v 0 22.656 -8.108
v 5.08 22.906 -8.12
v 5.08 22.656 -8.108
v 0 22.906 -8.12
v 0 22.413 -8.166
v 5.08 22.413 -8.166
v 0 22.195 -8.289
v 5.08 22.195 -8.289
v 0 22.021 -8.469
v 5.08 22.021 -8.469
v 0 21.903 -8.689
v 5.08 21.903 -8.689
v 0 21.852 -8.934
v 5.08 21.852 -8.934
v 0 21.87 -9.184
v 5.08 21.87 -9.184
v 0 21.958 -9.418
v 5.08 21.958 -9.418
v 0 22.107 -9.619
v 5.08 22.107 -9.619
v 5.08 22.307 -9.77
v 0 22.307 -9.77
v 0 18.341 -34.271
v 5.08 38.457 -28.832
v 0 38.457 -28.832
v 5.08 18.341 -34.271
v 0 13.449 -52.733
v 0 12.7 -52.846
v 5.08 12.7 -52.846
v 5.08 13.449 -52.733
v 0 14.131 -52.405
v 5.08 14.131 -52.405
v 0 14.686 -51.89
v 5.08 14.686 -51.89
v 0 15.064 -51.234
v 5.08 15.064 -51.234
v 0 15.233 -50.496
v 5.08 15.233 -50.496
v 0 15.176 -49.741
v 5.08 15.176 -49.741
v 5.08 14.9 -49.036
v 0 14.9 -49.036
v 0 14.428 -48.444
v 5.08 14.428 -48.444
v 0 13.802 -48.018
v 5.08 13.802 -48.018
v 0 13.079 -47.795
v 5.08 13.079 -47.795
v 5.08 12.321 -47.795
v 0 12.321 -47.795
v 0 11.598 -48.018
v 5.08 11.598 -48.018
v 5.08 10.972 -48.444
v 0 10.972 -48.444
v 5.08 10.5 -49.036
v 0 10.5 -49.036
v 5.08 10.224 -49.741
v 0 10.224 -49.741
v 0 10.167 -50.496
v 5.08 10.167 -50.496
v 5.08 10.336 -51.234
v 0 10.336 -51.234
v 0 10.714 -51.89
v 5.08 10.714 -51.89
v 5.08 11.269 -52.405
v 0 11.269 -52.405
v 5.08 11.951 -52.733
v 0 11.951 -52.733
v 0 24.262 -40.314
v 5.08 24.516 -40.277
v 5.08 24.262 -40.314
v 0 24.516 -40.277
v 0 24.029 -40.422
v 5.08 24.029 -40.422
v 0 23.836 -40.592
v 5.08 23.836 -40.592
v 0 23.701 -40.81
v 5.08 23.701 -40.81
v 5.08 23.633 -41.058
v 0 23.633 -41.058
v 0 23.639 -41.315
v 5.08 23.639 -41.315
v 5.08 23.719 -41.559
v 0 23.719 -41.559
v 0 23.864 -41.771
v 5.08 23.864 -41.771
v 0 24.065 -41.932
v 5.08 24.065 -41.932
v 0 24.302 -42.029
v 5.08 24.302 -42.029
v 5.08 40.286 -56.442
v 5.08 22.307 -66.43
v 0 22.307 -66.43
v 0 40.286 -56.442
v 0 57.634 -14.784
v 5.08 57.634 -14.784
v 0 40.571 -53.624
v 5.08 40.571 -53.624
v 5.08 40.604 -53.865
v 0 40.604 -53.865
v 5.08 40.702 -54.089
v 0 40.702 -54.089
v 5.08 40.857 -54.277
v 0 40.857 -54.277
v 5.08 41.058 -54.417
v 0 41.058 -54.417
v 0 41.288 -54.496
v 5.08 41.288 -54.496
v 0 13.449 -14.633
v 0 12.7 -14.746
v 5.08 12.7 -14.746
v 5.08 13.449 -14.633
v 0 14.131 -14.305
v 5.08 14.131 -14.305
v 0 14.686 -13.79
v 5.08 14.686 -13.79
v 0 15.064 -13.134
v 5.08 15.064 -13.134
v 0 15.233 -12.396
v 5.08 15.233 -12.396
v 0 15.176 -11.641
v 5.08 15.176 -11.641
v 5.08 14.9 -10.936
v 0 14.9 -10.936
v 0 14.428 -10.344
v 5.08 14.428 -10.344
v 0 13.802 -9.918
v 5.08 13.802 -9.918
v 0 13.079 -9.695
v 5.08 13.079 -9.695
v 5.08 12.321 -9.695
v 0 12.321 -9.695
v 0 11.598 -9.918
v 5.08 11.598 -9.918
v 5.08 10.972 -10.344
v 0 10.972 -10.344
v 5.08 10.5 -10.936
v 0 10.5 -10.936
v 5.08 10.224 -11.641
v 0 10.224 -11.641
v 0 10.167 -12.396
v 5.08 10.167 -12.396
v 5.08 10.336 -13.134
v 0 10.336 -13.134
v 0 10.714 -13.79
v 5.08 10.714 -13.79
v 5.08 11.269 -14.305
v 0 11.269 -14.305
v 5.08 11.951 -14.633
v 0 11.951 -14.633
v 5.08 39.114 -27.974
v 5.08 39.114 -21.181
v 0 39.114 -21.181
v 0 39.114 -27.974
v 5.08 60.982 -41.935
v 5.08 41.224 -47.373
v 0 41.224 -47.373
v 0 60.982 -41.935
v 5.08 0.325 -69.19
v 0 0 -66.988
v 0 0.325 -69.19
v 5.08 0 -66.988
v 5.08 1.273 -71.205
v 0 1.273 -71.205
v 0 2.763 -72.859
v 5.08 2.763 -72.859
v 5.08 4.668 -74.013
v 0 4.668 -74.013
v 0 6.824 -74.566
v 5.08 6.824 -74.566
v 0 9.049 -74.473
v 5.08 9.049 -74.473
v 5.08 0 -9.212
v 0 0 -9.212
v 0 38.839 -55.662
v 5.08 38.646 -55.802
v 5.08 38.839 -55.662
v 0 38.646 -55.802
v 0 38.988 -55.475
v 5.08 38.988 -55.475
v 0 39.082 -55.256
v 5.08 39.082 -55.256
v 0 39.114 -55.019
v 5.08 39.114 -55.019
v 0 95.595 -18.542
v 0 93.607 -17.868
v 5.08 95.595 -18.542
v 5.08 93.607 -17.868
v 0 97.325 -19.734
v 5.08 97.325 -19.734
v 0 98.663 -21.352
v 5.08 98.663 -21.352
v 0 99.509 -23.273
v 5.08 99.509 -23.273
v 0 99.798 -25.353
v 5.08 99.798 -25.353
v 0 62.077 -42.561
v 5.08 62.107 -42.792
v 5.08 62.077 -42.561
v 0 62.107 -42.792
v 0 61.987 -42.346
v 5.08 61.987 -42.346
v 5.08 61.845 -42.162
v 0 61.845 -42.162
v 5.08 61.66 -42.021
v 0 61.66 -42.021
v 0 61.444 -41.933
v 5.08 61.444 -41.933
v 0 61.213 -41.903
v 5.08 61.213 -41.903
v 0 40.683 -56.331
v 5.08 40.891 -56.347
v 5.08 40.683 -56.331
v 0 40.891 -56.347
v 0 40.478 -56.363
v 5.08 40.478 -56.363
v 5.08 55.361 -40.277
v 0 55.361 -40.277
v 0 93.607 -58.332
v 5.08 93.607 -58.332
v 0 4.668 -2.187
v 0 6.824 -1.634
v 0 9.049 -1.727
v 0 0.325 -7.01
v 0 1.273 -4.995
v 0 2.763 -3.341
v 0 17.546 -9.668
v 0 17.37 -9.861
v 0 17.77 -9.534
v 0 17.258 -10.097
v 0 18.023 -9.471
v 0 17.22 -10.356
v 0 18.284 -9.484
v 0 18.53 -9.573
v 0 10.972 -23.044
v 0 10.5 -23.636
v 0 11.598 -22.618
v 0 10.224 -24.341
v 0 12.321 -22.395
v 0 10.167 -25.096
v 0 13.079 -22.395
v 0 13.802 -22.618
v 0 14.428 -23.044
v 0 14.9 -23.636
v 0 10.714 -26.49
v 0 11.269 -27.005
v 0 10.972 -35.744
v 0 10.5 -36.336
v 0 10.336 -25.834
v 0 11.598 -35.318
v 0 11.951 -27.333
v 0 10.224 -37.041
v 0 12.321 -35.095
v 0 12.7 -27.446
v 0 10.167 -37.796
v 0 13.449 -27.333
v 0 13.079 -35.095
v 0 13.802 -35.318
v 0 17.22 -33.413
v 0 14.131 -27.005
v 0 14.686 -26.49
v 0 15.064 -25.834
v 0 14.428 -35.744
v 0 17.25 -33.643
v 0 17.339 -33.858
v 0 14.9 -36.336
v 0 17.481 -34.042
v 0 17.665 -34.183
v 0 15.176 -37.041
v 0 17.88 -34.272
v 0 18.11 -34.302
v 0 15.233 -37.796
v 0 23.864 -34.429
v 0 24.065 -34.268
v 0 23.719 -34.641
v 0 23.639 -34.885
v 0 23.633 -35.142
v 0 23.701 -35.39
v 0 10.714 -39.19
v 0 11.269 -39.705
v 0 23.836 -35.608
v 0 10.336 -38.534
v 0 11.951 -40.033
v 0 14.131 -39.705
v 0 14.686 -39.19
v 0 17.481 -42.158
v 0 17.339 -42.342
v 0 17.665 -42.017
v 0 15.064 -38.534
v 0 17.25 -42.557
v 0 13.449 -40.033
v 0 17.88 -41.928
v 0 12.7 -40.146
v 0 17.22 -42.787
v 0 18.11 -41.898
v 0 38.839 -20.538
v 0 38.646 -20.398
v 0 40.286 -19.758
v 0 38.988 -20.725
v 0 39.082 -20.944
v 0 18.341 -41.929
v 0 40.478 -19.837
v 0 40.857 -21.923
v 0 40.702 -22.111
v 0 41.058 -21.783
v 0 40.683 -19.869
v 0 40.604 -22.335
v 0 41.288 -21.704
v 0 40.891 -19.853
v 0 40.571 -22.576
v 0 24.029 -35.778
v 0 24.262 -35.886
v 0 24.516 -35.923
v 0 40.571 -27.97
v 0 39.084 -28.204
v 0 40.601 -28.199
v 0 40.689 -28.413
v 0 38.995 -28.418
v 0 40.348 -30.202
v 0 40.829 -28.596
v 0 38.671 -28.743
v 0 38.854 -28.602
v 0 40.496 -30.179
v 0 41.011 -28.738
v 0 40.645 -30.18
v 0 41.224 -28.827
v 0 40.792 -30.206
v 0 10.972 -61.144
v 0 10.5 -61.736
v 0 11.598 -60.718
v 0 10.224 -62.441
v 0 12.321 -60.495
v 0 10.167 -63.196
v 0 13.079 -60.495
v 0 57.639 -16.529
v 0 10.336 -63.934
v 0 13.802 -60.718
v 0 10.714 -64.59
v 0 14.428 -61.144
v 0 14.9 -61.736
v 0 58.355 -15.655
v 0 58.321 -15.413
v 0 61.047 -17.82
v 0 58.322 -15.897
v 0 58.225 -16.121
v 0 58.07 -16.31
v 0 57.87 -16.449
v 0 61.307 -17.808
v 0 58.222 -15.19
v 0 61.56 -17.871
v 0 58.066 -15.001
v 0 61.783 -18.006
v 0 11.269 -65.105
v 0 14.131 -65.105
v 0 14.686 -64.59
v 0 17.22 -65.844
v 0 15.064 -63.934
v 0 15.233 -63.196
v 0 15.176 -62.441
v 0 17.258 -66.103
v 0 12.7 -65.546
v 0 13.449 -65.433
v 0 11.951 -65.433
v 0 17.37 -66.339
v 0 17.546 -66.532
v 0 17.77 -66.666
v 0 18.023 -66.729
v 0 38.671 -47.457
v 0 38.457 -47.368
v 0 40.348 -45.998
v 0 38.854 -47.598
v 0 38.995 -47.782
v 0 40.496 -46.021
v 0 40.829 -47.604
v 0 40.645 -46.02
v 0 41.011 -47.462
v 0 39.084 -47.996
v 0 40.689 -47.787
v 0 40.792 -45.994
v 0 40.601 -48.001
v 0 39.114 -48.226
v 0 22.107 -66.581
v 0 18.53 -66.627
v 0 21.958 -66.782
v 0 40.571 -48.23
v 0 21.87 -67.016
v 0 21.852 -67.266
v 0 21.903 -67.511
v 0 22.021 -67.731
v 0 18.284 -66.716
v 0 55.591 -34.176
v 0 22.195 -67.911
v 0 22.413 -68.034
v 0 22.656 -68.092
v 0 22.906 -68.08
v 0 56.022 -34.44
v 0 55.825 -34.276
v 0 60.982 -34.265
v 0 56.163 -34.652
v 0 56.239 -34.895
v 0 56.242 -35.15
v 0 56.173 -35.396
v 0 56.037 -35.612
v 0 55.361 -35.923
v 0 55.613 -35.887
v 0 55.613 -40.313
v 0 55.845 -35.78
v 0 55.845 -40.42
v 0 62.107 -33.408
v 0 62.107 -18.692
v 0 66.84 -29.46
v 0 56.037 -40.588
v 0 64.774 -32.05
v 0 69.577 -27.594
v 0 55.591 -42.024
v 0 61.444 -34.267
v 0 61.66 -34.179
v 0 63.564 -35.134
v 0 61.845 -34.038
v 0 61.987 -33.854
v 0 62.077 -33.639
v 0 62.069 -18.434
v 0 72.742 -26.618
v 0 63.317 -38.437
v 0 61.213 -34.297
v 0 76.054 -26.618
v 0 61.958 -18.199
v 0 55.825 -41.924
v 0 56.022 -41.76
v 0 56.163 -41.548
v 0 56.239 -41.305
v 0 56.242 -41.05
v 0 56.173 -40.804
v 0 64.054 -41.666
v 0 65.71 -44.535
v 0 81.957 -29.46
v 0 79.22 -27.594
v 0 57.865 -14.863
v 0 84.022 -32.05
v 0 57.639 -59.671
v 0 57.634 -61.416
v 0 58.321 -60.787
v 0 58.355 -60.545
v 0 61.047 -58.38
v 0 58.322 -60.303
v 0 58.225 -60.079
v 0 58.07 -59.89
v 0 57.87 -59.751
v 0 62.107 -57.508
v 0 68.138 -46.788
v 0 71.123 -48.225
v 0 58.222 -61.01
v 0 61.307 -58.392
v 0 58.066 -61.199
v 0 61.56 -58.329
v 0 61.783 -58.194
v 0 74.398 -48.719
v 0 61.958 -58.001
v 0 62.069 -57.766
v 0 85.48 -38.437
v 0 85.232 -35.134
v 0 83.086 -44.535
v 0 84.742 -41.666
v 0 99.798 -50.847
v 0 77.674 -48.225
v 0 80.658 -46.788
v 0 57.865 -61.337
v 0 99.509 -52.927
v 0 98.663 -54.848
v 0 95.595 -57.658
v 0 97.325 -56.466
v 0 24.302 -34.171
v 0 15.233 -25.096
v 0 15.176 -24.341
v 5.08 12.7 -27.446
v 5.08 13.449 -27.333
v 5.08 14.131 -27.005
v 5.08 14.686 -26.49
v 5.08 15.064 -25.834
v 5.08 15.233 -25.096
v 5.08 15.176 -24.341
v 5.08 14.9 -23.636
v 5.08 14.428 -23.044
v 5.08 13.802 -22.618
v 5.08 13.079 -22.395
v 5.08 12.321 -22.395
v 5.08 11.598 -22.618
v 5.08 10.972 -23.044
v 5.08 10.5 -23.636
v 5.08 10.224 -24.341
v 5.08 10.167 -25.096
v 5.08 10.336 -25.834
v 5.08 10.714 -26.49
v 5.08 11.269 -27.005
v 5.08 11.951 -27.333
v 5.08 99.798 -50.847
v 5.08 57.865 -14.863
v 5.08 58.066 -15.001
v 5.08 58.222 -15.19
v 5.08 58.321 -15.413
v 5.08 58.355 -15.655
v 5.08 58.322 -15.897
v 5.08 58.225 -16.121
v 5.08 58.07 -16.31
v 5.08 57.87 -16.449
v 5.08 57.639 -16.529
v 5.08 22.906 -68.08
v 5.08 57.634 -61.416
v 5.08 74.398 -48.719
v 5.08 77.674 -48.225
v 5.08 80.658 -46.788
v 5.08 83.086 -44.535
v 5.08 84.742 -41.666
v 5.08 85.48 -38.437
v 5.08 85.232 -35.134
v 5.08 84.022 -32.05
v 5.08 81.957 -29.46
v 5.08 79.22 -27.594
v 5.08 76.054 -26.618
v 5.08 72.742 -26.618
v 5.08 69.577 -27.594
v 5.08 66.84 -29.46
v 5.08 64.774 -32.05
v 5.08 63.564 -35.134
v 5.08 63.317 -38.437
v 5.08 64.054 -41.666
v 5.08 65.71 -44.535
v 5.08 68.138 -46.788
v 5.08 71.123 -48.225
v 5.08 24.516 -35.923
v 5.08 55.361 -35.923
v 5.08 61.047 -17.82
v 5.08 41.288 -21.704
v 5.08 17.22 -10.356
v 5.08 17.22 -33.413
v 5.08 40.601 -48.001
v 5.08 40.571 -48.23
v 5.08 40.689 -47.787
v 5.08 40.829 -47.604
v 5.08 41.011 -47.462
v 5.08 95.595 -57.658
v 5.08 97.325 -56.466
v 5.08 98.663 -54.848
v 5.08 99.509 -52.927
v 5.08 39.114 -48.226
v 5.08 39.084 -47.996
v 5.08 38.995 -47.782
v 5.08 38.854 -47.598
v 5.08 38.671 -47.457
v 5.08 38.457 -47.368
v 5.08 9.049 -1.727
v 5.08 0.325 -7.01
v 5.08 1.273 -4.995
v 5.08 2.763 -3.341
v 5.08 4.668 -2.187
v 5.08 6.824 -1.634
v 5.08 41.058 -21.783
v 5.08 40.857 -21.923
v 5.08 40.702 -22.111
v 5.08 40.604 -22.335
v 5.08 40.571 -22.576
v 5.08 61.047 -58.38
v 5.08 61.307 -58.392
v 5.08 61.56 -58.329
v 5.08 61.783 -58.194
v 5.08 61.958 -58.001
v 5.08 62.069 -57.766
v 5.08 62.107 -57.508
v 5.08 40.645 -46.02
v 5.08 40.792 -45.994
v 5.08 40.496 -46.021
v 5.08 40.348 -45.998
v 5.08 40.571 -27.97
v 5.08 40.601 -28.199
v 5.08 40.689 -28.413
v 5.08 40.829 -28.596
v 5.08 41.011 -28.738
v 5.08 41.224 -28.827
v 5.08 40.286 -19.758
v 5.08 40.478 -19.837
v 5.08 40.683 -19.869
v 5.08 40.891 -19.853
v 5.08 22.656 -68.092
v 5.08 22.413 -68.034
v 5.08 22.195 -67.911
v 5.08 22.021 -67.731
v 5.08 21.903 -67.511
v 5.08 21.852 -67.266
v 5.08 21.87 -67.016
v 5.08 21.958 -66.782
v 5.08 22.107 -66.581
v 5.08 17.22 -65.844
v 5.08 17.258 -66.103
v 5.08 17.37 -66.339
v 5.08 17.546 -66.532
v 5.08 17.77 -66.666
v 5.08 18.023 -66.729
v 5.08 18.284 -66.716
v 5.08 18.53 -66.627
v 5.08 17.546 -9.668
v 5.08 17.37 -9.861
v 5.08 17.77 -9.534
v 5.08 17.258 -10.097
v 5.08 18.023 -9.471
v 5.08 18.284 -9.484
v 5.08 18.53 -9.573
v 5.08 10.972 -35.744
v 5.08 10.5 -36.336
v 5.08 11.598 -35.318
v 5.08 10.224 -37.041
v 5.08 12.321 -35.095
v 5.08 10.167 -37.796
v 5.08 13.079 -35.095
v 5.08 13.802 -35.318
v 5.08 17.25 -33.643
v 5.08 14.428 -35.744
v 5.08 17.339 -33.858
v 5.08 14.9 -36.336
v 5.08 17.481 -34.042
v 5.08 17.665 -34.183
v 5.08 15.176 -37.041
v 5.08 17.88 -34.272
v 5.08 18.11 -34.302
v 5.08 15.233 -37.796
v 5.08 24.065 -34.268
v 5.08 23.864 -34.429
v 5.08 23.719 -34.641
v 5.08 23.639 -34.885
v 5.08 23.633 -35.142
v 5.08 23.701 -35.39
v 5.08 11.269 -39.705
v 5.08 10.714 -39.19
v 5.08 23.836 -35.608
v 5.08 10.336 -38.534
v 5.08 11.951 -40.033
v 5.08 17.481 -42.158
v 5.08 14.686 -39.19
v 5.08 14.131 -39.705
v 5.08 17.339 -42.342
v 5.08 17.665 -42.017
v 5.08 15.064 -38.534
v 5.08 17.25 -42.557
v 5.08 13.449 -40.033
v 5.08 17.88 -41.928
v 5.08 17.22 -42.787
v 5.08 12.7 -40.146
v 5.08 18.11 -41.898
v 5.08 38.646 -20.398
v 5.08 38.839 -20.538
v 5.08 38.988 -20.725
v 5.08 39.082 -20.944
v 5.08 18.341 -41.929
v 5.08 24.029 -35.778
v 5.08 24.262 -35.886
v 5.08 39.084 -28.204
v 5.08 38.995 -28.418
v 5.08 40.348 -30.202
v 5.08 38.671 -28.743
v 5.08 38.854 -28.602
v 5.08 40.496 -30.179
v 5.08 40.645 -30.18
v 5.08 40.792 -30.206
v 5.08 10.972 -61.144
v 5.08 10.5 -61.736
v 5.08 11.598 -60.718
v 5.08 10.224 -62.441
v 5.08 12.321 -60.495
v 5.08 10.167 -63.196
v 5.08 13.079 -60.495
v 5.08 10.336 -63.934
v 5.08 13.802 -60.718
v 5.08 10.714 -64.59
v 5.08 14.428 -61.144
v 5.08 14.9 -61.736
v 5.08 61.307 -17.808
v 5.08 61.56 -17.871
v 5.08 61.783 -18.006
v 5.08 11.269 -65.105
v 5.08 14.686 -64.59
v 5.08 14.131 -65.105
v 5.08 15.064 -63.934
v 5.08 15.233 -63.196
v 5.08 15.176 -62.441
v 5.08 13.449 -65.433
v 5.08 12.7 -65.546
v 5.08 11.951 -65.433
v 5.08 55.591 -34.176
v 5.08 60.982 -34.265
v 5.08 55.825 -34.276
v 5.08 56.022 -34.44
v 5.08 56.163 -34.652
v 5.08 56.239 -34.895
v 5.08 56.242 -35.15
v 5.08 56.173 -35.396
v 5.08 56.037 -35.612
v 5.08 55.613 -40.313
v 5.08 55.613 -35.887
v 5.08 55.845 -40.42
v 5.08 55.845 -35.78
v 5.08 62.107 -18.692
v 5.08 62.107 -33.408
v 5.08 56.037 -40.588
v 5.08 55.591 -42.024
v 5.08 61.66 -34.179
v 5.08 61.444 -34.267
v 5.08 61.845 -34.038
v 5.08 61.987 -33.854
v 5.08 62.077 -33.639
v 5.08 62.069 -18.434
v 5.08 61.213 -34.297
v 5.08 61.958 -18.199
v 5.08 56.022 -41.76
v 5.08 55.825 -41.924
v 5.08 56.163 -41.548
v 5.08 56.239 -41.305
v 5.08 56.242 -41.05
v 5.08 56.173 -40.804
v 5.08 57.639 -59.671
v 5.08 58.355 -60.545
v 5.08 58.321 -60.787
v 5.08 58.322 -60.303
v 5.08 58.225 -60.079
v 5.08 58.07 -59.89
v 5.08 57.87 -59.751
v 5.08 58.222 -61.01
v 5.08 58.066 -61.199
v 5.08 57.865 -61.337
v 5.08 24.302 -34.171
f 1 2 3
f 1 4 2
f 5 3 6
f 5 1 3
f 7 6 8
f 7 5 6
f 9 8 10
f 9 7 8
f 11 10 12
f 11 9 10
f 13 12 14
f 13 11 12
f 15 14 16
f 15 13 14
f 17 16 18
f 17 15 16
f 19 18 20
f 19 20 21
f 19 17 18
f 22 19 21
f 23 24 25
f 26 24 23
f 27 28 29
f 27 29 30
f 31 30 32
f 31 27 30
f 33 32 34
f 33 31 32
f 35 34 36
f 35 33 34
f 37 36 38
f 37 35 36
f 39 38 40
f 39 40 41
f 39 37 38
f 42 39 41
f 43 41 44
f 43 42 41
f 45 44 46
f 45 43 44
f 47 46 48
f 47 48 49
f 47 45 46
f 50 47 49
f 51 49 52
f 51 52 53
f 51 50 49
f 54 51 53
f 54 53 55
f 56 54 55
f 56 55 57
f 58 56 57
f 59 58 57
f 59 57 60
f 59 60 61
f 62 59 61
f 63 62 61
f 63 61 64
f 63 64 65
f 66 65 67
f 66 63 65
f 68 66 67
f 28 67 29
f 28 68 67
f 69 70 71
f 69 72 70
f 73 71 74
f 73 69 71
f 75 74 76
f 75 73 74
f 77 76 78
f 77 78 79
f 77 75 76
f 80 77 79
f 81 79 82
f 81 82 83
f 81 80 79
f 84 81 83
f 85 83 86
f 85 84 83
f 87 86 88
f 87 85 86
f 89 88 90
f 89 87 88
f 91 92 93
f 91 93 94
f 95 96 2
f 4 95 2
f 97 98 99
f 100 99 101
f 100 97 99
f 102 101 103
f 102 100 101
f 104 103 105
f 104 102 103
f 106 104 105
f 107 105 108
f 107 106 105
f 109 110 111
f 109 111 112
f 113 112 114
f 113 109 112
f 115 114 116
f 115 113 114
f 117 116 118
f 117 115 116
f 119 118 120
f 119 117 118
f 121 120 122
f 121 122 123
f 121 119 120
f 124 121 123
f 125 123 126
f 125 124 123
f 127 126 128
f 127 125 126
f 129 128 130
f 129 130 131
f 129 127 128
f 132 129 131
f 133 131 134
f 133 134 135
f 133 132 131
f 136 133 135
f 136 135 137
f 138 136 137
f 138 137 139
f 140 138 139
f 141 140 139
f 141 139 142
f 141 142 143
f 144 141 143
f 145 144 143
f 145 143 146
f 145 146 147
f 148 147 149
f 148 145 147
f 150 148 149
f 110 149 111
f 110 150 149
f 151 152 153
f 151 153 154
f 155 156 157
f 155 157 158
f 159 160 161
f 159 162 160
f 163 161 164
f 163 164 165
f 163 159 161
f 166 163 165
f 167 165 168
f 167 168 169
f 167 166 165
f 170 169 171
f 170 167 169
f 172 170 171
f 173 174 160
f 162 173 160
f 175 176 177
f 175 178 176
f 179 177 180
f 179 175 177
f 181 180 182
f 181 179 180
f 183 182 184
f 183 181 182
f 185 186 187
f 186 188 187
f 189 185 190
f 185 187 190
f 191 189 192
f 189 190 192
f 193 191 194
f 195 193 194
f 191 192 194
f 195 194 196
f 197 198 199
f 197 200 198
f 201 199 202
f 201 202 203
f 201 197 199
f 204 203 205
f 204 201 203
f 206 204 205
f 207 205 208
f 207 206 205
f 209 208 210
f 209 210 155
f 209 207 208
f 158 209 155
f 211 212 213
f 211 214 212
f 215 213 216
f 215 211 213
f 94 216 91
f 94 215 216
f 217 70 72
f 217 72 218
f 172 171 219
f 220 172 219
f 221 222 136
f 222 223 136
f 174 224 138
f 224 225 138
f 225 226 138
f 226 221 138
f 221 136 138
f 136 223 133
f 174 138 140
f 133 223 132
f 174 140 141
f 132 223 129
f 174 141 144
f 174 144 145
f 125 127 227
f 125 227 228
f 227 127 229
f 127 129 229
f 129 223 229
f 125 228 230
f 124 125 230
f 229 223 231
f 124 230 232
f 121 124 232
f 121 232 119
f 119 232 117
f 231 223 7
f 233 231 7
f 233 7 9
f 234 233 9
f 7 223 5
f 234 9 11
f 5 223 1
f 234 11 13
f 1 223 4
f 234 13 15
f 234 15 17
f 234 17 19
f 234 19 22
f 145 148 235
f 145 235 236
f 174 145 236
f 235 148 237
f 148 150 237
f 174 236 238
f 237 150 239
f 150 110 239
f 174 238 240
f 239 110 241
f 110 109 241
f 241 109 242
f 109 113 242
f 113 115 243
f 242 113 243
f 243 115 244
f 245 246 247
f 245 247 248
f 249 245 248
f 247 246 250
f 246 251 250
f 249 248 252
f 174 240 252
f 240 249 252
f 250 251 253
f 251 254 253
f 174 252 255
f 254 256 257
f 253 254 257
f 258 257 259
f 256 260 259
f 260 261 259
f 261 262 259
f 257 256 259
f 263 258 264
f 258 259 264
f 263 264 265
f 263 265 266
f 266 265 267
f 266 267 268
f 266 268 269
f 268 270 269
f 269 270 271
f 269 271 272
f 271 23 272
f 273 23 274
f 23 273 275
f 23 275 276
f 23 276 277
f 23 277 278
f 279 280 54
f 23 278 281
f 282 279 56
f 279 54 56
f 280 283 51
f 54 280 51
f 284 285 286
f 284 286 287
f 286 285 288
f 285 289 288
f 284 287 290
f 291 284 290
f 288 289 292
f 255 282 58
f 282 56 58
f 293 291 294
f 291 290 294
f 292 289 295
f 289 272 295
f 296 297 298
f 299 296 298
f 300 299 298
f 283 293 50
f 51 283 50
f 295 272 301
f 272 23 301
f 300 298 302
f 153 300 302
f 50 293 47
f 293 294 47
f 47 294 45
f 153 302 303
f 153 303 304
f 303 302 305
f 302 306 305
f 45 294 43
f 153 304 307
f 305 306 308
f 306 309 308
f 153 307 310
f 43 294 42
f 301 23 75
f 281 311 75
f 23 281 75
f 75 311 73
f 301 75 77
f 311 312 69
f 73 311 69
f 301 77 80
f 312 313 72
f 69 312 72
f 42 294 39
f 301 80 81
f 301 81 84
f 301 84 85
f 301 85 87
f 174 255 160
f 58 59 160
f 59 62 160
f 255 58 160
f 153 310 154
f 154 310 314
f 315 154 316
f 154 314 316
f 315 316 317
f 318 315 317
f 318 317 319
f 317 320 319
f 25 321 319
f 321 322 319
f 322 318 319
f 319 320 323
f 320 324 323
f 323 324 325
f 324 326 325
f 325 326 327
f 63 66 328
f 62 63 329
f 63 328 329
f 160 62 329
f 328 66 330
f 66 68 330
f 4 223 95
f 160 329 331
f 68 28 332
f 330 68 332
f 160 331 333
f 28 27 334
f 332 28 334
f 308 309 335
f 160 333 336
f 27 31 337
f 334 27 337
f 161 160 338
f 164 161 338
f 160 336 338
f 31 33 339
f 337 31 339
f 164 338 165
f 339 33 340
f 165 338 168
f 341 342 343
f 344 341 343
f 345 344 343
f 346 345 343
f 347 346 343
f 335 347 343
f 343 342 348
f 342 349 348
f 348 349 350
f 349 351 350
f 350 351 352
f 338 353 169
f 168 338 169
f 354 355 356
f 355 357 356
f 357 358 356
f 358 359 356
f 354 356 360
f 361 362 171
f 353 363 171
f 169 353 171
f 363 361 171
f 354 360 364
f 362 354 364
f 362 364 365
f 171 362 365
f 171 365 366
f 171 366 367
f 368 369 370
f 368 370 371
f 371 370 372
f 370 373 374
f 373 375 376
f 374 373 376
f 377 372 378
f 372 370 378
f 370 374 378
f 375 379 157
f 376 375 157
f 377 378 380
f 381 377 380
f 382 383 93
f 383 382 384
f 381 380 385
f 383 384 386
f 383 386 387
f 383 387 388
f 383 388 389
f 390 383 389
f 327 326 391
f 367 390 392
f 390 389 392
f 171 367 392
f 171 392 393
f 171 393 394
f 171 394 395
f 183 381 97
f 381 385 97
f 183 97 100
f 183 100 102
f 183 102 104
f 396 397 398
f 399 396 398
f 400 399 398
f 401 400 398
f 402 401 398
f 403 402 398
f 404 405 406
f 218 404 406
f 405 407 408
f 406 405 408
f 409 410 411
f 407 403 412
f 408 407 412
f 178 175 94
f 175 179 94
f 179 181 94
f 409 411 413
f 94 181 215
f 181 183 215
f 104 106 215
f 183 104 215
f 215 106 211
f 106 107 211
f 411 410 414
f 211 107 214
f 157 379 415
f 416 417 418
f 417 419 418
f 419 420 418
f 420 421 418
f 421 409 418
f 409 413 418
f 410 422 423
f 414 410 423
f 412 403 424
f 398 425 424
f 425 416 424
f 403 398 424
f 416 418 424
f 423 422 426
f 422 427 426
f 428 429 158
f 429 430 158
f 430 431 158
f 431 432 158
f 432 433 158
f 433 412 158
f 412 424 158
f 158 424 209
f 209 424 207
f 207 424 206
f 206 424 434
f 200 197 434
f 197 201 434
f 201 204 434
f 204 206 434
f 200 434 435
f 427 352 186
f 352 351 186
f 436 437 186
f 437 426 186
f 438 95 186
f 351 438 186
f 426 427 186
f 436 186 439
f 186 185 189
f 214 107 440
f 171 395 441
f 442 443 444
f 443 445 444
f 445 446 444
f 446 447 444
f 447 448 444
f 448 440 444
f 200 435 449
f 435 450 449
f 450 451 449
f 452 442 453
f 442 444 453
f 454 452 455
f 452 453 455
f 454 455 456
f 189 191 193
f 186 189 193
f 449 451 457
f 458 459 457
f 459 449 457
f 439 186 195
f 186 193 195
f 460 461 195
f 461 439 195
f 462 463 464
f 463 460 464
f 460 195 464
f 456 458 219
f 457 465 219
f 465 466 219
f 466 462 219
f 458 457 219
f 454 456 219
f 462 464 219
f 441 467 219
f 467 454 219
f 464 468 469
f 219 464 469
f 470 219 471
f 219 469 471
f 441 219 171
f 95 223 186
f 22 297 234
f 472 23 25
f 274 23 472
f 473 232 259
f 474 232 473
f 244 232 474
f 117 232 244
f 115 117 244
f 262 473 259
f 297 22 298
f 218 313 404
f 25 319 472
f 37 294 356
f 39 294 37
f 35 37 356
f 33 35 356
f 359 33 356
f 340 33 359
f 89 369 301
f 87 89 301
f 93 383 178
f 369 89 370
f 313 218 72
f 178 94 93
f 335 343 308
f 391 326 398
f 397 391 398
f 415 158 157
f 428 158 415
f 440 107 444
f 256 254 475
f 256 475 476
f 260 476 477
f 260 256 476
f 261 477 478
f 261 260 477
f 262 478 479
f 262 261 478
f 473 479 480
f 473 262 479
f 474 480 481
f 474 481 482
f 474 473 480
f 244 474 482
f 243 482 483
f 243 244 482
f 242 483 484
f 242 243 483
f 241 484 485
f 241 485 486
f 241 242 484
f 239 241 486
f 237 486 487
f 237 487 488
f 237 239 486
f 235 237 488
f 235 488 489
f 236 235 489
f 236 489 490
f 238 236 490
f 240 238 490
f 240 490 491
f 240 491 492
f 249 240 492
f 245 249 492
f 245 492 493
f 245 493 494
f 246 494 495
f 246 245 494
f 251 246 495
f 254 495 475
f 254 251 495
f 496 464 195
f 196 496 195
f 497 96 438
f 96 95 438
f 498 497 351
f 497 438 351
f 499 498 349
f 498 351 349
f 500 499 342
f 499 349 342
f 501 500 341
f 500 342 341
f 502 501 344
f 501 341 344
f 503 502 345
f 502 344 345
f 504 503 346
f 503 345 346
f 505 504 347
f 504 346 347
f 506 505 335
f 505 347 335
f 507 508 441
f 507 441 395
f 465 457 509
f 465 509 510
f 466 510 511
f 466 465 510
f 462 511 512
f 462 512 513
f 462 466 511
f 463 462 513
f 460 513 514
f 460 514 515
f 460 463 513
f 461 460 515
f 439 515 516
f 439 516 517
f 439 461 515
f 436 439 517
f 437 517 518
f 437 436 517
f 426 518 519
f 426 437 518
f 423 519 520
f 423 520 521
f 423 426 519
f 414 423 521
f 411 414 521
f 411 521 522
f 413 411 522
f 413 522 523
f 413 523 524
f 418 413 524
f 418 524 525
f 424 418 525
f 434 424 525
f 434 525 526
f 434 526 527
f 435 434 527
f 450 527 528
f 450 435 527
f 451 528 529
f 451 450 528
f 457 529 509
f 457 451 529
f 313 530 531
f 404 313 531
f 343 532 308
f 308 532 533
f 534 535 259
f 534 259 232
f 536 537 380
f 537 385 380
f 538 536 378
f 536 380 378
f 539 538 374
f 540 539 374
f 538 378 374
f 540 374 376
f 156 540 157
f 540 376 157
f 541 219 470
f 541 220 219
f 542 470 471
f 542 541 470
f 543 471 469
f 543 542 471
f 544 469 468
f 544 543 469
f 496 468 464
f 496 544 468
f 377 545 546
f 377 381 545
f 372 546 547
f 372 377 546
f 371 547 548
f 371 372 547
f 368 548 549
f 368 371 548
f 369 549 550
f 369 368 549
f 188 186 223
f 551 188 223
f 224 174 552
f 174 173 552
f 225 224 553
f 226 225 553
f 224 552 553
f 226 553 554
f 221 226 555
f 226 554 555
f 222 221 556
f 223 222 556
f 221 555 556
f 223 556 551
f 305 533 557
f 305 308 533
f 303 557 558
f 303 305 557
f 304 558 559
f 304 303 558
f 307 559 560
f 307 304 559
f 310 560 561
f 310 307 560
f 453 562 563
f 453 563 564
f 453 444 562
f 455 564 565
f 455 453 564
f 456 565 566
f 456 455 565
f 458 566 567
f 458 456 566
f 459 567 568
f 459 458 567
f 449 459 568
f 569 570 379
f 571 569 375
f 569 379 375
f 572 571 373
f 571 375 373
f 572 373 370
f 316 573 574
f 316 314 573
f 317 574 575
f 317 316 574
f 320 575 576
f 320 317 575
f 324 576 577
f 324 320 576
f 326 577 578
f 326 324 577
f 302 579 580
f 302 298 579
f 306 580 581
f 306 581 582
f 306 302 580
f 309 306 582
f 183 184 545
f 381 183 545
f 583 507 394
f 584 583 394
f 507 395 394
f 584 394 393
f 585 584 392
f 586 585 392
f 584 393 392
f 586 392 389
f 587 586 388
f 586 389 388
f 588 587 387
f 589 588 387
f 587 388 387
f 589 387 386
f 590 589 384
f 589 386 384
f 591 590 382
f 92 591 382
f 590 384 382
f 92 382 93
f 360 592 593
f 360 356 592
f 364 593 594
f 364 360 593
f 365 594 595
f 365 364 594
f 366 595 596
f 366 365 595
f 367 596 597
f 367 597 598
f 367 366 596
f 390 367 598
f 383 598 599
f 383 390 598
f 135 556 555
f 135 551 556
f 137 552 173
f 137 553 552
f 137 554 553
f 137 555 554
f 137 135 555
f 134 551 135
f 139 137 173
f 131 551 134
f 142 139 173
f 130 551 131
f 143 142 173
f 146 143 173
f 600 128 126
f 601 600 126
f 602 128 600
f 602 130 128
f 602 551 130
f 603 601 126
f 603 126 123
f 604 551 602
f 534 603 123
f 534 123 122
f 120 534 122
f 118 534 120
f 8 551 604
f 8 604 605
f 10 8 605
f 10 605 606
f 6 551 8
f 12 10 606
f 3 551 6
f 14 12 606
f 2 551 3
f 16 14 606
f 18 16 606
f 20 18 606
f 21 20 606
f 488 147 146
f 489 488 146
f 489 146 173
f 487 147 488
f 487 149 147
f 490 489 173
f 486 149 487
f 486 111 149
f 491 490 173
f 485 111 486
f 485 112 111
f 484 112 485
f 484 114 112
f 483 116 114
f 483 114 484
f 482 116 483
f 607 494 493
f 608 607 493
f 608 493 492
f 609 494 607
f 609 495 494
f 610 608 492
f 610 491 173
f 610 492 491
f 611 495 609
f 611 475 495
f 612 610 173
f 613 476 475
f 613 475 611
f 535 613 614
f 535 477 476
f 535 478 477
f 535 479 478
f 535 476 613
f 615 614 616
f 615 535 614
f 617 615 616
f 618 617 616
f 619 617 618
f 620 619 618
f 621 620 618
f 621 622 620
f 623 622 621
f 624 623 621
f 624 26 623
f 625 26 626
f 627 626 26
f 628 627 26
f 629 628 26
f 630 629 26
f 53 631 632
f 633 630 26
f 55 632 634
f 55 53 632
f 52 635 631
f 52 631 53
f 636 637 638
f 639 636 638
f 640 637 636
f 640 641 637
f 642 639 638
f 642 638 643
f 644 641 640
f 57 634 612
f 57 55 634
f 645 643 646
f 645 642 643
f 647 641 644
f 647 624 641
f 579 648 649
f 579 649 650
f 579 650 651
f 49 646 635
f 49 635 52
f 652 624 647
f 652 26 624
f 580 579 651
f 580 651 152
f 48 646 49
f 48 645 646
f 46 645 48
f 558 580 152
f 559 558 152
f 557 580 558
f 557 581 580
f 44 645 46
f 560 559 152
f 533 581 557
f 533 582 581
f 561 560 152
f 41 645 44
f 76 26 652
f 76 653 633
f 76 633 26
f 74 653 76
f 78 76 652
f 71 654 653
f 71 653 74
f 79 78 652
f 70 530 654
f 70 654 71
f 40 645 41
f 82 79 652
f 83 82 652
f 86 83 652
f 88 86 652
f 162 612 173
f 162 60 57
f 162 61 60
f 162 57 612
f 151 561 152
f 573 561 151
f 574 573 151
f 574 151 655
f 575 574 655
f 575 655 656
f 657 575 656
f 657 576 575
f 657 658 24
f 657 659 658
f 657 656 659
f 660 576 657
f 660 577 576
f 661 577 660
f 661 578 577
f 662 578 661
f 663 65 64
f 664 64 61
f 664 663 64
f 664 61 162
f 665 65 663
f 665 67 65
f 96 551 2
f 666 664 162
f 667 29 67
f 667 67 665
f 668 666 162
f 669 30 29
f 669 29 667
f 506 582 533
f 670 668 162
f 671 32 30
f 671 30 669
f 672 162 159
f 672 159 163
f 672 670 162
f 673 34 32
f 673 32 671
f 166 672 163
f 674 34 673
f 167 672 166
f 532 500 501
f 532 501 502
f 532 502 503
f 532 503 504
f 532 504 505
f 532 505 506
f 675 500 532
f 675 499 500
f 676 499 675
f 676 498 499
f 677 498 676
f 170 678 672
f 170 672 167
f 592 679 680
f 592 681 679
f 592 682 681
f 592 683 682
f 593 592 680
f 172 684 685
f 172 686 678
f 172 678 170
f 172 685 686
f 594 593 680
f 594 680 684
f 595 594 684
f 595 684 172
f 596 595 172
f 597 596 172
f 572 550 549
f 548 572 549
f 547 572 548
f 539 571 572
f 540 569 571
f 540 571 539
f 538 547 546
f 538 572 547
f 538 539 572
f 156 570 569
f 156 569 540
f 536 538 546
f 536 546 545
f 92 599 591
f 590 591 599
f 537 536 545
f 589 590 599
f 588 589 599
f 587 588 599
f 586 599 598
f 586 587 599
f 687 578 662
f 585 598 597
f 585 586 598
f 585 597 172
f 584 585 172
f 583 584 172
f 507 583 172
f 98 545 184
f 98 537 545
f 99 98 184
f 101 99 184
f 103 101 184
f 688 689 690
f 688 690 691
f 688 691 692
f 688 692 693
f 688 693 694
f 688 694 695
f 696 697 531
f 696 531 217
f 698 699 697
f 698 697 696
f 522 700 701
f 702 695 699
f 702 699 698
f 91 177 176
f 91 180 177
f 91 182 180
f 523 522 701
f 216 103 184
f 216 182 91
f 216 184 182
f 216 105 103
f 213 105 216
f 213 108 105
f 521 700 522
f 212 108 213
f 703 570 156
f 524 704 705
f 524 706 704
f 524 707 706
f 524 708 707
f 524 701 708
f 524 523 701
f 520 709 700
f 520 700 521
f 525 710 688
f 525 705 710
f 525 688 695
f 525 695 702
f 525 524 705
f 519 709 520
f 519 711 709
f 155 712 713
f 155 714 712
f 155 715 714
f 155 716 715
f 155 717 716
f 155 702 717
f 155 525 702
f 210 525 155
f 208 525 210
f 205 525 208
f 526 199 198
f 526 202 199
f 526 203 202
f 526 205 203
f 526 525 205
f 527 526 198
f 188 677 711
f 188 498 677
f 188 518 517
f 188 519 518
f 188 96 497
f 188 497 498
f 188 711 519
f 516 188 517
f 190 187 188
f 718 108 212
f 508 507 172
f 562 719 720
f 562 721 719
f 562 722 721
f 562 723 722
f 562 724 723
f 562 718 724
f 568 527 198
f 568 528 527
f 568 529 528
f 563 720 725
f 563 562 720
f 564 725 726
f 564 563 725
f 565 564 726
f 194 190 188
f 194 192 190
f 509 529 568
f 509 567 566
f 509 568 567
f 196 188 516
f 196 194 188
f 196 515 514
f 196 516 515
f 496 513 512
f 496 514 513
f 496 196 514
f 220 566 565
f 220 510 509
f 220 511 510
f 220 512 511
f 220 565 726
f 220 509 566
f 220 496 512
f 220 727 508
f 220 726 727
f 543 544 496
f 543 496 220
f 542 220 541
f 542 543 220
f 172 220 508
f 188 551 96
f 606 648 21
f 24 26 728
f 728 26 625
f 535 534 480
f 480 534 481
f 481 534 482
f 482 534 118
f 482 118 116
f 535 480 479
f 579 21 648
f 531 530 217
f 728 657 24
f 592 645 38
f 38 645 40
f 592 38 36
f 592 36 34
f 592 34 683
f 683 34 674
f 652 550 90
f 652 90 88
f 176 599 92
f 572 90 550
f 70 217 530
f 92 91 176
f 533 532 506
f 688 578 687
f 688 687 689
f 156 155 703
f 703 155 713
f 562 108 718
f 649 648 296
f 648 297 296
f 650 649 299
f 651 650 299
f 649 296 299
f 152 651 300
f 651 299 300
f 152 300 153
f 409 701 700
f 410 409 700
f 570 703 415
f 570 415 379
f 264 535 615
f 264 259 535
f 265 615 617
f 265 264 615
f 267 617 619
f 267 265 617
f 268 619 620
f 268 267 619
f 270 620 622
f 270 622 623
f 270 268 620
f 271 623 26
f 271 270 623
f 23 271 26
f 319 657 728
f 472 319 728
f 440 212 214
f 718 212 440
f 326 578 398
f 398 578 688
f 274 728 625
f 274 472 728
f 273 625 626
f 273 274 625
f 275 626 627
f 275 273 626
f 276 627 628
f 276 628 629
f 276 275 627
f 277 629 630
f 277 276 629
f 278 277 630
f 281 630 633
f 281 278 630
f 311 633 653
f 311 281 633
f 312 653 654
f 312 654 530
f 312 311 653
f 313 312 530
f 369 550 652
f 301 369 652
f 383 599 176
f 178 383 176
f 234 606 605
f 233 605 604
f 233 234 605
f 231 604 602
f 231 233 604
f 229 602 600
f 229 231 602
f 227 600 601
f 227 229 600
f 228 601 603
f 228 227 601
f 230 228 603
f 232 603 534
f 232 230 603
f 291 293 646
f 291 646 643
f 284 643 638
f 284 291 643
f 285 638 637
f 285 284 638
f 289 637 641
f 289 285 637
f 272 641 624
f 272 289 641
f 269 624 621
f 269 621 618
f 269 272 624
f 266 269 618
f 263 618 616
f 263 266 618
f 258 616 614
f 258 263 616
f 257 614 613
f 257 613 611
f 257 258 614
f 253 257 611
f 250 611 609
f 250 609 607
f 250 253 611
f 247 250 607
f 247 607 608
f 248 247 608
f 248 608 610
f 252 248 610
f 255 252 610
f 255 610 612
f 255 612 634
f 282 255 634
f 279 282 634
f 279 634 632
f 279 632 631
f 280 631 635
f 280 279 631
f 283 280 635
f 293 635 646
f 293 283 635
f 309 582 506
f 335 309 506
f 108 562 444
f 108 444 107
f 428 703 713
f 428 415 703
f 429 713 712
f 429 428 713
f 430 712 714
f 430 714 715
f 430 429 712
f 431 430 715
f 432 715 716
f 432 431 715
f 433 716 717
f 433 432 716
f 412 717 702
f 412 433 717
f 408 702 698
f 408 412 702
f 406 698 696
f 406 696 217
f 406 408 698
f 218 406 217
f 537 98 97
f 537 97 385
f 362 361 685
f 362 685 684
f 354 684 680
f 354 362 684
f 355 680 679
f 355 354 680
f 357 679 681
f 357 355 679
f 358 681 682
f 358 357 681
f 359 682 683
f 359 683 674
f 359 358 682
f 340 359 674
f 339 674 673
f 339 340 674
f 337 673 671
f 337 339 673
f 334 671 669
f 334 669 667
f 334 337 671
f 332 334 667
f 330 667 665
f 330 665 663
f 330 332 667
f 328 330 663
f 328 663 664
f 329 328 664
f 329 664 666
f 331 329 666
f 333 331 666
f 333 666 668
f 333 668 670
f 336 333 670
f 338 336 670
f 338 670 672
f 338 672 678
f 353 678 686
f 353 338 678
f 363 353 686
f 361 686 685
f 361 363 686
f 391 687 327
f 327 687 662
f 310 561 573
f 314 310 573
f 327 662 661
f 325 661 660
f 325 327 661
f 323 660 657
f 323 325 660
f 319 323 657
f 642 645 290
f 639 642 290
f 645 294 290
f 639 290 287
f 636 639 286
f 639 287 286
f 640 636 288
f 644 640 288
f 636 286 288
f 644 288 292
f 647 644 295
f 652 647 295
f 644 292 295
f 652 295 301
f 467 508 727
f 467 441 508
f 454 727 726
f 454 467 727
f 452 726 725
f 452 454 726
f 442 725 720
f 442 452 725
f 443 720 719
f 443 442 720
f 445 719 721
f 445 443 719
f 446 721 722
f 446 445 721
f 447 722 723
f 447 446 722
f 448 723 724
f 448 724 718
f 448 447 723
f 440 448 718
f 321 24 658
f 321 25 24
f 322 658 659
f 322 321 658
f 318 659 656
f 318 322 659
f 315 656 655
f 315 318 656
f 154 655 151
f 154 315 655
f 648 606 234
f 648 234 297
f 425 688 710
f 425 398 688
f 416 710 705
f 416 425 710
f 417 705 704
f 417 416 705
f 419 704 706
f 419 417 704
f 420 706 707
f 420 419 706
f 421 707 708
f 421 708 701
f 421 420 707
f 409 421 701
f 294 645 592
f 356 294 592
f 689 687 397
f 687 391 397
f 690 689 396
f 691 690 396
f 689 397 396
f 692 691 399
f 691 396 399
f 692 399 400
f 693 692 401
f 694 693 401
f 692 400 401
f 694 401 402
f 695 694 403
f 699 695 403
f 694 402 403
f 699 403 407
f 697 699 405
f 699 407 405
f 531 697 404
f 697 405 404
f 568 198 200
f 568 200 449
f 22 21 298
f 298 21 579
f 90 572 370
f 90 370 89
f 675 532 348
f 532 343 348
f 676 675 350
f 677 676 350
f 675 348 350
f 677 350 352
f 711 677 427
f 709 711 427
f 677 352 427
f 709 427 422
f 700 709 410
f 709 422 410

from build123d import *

# Parameters (mm, degrees)
SKETCH1_R           = 11.1125
SKETCH1_R_2         = 2.54
BOSS_EXTRUDE2_DEPTH = 5.08
FILLET1_R           = 7.62
CUT_EXTRUDE1_DEPTH  = 125.706848436
FILLET2_R           = 0.889


with BuildPart() as part:
    # Sketch1 → Boss-Extrude2 (new body)
    with BuildSketch(Plane(origin=(0, 0, 0), x_dir=(0, 0, -1), z_dir=(1, 0, 0))):
        Polygon((0, 0), (76.2, 0), (57.15, 99.798083649), (19.05, 99.798083649), align=None)
        with Locations((37.606341954, 74.398083649)):
            Circle(SKETCH1_R, mode=Mode.SUBTRACT)
        with Locations((37.606341954, 12.7)):
            Circle(SKETCH1_R_2, mode=Mode.SUBTRACT)
        with Locations((50.306341954, 12.7)):
            Circle(SKETCH1_R_2, mode=Mode.SUBTRACT)
        with Locations((63.006341954, 12.7)):
            Circle(SKETCH1_R_2, mode=Mode.SUBTRACT)
        with Locations((24.906341954, 12.7)):
            Circle(SKETCH1_R_2, mode=Mode.SUBTRACT)
        with Locations((12.206341954, 12.7)):
            Circle(SKETCH1_R_2, mode=Mode.SUBTRACT)
    extrude(amount=BOSS_EXTRUDE2_DEPTH)

    # Fillet1
    fillet1_edges = [part.edges().sort_by_distance(p)[0] for p in [
        (2.54, 99.798083649, -19.05),
        (2.54, 99.798083649, -57.15),
        (2.54, 0, -76.2),
        (2.54, 0, 0),
    ]]
    fillet(fillet1_edges, radius=FILLET1_R)

    # Sketch2 → Cut-Extrude1 (cut, through all)
    with BuildSketch(Plane(origin=(5.08, 0, 0), x_dir=(0, 0, -1), z_dir=(1, 0, 0))):
        Polygon((15.642904874, 62.107158672), (7.073205763, 17.452721053), (19.916541068, 40.570724603), align=None)
        Polygon((17.611424893, 62.107158672), (21.844949021, 40.570724603), (28.647489973, 40.570724603), (34.574296097, 62.107158672), align=None)
        Polygon((35.923336714, 62.107158672), (30.147133884, 40.570724603), (35.923336714, 17.219658997), align=None)
        Polygon((20.649761965, 39.113872964), (28.654674446, 39.113872964), (34.574296097, 17.219658997), (8.867656367, 17.219658997), align=None)
        Polygon((46.052866116, 40.570724603), (40.276663286, 17.219658997), (40.276663286, 62.107158672), align=None)
        Polygon((41.625703903, 17.219658997), (67.332343633, 17.219658997), (55.550238035, 39.113872964), (47.545325554, 39.113872964), align=None)
        Polygon((69.126794237, 17.452721053), (56.283458932, 40.570724603), (60.557095126, 62.107158672), align=None)
        Polygon((47.552510027, 40.570724603), (41.625703903, 62.107158672), (58.588575107, 62.107158672), (54.355050979, 40.570724603), align=None)
    extrude(amount=-CUT_EXTRUDE1_DEPTH, mode=Mode.SUBTRACT)

    # Fillet2
    fillet2_edges = [part.edges().sort_by_distance(p)[0] for p in [
        (2.54, 62.107158672, -17.611424893),
        (2.54, 62.107158672, -34.574296097),
        (2.54, 40.570724603, -28.647489973),
        (2.54, 40.570724603, -21.844949021),
        (2.54, 62.107158672, -35.923336714),
        (2.54, 17.219658997, -35.923336714),
        (2.54, 40.570724603, -30.147133884),
        (2.54, 40.570724603, -54.355050979),
        (2.54, 40.570724603, -47.552510027),
        (2.54, 62.107158672, -41.625703903),
        (2.54, 62.107158672, -58.588575107),
        (2.54, 17.219658997, -41.625703903),
        (2.54, 39.113872964, -47.545325554),
        (2.54, 39.113872964, -55.550238035),
        (2.54, 17.219658997, -67.332343633),
        (2.54, 62.107158672, -60.557095126),
        (2.54, 17.452721053, -69.126794237),
        (2.54, 40.570724603, -56.283458932),
        (2.54, 62.107158672, -15.642904874),
        (2.54, 40.570724603, -19.916541068),
        (2.54, 17.452721053, -7.073205763),
        (2.54, 62.107158672, -40.276663286),
        (2.54, 40.570724603, -46.052866116),
        (2.54, 17.219658997, -40.276663286),
        (2.54, 17.219658997, -34.574296097),
        (2.54, 17.219658997, -8.867656367),
        (2.54, 39.113872964, -20.649761965),
        (2.54, 39.113872964, -28.654674446),
    ]]
    fillet(fillet2_edges, radius=FILLET2_R)


solid = part.part
